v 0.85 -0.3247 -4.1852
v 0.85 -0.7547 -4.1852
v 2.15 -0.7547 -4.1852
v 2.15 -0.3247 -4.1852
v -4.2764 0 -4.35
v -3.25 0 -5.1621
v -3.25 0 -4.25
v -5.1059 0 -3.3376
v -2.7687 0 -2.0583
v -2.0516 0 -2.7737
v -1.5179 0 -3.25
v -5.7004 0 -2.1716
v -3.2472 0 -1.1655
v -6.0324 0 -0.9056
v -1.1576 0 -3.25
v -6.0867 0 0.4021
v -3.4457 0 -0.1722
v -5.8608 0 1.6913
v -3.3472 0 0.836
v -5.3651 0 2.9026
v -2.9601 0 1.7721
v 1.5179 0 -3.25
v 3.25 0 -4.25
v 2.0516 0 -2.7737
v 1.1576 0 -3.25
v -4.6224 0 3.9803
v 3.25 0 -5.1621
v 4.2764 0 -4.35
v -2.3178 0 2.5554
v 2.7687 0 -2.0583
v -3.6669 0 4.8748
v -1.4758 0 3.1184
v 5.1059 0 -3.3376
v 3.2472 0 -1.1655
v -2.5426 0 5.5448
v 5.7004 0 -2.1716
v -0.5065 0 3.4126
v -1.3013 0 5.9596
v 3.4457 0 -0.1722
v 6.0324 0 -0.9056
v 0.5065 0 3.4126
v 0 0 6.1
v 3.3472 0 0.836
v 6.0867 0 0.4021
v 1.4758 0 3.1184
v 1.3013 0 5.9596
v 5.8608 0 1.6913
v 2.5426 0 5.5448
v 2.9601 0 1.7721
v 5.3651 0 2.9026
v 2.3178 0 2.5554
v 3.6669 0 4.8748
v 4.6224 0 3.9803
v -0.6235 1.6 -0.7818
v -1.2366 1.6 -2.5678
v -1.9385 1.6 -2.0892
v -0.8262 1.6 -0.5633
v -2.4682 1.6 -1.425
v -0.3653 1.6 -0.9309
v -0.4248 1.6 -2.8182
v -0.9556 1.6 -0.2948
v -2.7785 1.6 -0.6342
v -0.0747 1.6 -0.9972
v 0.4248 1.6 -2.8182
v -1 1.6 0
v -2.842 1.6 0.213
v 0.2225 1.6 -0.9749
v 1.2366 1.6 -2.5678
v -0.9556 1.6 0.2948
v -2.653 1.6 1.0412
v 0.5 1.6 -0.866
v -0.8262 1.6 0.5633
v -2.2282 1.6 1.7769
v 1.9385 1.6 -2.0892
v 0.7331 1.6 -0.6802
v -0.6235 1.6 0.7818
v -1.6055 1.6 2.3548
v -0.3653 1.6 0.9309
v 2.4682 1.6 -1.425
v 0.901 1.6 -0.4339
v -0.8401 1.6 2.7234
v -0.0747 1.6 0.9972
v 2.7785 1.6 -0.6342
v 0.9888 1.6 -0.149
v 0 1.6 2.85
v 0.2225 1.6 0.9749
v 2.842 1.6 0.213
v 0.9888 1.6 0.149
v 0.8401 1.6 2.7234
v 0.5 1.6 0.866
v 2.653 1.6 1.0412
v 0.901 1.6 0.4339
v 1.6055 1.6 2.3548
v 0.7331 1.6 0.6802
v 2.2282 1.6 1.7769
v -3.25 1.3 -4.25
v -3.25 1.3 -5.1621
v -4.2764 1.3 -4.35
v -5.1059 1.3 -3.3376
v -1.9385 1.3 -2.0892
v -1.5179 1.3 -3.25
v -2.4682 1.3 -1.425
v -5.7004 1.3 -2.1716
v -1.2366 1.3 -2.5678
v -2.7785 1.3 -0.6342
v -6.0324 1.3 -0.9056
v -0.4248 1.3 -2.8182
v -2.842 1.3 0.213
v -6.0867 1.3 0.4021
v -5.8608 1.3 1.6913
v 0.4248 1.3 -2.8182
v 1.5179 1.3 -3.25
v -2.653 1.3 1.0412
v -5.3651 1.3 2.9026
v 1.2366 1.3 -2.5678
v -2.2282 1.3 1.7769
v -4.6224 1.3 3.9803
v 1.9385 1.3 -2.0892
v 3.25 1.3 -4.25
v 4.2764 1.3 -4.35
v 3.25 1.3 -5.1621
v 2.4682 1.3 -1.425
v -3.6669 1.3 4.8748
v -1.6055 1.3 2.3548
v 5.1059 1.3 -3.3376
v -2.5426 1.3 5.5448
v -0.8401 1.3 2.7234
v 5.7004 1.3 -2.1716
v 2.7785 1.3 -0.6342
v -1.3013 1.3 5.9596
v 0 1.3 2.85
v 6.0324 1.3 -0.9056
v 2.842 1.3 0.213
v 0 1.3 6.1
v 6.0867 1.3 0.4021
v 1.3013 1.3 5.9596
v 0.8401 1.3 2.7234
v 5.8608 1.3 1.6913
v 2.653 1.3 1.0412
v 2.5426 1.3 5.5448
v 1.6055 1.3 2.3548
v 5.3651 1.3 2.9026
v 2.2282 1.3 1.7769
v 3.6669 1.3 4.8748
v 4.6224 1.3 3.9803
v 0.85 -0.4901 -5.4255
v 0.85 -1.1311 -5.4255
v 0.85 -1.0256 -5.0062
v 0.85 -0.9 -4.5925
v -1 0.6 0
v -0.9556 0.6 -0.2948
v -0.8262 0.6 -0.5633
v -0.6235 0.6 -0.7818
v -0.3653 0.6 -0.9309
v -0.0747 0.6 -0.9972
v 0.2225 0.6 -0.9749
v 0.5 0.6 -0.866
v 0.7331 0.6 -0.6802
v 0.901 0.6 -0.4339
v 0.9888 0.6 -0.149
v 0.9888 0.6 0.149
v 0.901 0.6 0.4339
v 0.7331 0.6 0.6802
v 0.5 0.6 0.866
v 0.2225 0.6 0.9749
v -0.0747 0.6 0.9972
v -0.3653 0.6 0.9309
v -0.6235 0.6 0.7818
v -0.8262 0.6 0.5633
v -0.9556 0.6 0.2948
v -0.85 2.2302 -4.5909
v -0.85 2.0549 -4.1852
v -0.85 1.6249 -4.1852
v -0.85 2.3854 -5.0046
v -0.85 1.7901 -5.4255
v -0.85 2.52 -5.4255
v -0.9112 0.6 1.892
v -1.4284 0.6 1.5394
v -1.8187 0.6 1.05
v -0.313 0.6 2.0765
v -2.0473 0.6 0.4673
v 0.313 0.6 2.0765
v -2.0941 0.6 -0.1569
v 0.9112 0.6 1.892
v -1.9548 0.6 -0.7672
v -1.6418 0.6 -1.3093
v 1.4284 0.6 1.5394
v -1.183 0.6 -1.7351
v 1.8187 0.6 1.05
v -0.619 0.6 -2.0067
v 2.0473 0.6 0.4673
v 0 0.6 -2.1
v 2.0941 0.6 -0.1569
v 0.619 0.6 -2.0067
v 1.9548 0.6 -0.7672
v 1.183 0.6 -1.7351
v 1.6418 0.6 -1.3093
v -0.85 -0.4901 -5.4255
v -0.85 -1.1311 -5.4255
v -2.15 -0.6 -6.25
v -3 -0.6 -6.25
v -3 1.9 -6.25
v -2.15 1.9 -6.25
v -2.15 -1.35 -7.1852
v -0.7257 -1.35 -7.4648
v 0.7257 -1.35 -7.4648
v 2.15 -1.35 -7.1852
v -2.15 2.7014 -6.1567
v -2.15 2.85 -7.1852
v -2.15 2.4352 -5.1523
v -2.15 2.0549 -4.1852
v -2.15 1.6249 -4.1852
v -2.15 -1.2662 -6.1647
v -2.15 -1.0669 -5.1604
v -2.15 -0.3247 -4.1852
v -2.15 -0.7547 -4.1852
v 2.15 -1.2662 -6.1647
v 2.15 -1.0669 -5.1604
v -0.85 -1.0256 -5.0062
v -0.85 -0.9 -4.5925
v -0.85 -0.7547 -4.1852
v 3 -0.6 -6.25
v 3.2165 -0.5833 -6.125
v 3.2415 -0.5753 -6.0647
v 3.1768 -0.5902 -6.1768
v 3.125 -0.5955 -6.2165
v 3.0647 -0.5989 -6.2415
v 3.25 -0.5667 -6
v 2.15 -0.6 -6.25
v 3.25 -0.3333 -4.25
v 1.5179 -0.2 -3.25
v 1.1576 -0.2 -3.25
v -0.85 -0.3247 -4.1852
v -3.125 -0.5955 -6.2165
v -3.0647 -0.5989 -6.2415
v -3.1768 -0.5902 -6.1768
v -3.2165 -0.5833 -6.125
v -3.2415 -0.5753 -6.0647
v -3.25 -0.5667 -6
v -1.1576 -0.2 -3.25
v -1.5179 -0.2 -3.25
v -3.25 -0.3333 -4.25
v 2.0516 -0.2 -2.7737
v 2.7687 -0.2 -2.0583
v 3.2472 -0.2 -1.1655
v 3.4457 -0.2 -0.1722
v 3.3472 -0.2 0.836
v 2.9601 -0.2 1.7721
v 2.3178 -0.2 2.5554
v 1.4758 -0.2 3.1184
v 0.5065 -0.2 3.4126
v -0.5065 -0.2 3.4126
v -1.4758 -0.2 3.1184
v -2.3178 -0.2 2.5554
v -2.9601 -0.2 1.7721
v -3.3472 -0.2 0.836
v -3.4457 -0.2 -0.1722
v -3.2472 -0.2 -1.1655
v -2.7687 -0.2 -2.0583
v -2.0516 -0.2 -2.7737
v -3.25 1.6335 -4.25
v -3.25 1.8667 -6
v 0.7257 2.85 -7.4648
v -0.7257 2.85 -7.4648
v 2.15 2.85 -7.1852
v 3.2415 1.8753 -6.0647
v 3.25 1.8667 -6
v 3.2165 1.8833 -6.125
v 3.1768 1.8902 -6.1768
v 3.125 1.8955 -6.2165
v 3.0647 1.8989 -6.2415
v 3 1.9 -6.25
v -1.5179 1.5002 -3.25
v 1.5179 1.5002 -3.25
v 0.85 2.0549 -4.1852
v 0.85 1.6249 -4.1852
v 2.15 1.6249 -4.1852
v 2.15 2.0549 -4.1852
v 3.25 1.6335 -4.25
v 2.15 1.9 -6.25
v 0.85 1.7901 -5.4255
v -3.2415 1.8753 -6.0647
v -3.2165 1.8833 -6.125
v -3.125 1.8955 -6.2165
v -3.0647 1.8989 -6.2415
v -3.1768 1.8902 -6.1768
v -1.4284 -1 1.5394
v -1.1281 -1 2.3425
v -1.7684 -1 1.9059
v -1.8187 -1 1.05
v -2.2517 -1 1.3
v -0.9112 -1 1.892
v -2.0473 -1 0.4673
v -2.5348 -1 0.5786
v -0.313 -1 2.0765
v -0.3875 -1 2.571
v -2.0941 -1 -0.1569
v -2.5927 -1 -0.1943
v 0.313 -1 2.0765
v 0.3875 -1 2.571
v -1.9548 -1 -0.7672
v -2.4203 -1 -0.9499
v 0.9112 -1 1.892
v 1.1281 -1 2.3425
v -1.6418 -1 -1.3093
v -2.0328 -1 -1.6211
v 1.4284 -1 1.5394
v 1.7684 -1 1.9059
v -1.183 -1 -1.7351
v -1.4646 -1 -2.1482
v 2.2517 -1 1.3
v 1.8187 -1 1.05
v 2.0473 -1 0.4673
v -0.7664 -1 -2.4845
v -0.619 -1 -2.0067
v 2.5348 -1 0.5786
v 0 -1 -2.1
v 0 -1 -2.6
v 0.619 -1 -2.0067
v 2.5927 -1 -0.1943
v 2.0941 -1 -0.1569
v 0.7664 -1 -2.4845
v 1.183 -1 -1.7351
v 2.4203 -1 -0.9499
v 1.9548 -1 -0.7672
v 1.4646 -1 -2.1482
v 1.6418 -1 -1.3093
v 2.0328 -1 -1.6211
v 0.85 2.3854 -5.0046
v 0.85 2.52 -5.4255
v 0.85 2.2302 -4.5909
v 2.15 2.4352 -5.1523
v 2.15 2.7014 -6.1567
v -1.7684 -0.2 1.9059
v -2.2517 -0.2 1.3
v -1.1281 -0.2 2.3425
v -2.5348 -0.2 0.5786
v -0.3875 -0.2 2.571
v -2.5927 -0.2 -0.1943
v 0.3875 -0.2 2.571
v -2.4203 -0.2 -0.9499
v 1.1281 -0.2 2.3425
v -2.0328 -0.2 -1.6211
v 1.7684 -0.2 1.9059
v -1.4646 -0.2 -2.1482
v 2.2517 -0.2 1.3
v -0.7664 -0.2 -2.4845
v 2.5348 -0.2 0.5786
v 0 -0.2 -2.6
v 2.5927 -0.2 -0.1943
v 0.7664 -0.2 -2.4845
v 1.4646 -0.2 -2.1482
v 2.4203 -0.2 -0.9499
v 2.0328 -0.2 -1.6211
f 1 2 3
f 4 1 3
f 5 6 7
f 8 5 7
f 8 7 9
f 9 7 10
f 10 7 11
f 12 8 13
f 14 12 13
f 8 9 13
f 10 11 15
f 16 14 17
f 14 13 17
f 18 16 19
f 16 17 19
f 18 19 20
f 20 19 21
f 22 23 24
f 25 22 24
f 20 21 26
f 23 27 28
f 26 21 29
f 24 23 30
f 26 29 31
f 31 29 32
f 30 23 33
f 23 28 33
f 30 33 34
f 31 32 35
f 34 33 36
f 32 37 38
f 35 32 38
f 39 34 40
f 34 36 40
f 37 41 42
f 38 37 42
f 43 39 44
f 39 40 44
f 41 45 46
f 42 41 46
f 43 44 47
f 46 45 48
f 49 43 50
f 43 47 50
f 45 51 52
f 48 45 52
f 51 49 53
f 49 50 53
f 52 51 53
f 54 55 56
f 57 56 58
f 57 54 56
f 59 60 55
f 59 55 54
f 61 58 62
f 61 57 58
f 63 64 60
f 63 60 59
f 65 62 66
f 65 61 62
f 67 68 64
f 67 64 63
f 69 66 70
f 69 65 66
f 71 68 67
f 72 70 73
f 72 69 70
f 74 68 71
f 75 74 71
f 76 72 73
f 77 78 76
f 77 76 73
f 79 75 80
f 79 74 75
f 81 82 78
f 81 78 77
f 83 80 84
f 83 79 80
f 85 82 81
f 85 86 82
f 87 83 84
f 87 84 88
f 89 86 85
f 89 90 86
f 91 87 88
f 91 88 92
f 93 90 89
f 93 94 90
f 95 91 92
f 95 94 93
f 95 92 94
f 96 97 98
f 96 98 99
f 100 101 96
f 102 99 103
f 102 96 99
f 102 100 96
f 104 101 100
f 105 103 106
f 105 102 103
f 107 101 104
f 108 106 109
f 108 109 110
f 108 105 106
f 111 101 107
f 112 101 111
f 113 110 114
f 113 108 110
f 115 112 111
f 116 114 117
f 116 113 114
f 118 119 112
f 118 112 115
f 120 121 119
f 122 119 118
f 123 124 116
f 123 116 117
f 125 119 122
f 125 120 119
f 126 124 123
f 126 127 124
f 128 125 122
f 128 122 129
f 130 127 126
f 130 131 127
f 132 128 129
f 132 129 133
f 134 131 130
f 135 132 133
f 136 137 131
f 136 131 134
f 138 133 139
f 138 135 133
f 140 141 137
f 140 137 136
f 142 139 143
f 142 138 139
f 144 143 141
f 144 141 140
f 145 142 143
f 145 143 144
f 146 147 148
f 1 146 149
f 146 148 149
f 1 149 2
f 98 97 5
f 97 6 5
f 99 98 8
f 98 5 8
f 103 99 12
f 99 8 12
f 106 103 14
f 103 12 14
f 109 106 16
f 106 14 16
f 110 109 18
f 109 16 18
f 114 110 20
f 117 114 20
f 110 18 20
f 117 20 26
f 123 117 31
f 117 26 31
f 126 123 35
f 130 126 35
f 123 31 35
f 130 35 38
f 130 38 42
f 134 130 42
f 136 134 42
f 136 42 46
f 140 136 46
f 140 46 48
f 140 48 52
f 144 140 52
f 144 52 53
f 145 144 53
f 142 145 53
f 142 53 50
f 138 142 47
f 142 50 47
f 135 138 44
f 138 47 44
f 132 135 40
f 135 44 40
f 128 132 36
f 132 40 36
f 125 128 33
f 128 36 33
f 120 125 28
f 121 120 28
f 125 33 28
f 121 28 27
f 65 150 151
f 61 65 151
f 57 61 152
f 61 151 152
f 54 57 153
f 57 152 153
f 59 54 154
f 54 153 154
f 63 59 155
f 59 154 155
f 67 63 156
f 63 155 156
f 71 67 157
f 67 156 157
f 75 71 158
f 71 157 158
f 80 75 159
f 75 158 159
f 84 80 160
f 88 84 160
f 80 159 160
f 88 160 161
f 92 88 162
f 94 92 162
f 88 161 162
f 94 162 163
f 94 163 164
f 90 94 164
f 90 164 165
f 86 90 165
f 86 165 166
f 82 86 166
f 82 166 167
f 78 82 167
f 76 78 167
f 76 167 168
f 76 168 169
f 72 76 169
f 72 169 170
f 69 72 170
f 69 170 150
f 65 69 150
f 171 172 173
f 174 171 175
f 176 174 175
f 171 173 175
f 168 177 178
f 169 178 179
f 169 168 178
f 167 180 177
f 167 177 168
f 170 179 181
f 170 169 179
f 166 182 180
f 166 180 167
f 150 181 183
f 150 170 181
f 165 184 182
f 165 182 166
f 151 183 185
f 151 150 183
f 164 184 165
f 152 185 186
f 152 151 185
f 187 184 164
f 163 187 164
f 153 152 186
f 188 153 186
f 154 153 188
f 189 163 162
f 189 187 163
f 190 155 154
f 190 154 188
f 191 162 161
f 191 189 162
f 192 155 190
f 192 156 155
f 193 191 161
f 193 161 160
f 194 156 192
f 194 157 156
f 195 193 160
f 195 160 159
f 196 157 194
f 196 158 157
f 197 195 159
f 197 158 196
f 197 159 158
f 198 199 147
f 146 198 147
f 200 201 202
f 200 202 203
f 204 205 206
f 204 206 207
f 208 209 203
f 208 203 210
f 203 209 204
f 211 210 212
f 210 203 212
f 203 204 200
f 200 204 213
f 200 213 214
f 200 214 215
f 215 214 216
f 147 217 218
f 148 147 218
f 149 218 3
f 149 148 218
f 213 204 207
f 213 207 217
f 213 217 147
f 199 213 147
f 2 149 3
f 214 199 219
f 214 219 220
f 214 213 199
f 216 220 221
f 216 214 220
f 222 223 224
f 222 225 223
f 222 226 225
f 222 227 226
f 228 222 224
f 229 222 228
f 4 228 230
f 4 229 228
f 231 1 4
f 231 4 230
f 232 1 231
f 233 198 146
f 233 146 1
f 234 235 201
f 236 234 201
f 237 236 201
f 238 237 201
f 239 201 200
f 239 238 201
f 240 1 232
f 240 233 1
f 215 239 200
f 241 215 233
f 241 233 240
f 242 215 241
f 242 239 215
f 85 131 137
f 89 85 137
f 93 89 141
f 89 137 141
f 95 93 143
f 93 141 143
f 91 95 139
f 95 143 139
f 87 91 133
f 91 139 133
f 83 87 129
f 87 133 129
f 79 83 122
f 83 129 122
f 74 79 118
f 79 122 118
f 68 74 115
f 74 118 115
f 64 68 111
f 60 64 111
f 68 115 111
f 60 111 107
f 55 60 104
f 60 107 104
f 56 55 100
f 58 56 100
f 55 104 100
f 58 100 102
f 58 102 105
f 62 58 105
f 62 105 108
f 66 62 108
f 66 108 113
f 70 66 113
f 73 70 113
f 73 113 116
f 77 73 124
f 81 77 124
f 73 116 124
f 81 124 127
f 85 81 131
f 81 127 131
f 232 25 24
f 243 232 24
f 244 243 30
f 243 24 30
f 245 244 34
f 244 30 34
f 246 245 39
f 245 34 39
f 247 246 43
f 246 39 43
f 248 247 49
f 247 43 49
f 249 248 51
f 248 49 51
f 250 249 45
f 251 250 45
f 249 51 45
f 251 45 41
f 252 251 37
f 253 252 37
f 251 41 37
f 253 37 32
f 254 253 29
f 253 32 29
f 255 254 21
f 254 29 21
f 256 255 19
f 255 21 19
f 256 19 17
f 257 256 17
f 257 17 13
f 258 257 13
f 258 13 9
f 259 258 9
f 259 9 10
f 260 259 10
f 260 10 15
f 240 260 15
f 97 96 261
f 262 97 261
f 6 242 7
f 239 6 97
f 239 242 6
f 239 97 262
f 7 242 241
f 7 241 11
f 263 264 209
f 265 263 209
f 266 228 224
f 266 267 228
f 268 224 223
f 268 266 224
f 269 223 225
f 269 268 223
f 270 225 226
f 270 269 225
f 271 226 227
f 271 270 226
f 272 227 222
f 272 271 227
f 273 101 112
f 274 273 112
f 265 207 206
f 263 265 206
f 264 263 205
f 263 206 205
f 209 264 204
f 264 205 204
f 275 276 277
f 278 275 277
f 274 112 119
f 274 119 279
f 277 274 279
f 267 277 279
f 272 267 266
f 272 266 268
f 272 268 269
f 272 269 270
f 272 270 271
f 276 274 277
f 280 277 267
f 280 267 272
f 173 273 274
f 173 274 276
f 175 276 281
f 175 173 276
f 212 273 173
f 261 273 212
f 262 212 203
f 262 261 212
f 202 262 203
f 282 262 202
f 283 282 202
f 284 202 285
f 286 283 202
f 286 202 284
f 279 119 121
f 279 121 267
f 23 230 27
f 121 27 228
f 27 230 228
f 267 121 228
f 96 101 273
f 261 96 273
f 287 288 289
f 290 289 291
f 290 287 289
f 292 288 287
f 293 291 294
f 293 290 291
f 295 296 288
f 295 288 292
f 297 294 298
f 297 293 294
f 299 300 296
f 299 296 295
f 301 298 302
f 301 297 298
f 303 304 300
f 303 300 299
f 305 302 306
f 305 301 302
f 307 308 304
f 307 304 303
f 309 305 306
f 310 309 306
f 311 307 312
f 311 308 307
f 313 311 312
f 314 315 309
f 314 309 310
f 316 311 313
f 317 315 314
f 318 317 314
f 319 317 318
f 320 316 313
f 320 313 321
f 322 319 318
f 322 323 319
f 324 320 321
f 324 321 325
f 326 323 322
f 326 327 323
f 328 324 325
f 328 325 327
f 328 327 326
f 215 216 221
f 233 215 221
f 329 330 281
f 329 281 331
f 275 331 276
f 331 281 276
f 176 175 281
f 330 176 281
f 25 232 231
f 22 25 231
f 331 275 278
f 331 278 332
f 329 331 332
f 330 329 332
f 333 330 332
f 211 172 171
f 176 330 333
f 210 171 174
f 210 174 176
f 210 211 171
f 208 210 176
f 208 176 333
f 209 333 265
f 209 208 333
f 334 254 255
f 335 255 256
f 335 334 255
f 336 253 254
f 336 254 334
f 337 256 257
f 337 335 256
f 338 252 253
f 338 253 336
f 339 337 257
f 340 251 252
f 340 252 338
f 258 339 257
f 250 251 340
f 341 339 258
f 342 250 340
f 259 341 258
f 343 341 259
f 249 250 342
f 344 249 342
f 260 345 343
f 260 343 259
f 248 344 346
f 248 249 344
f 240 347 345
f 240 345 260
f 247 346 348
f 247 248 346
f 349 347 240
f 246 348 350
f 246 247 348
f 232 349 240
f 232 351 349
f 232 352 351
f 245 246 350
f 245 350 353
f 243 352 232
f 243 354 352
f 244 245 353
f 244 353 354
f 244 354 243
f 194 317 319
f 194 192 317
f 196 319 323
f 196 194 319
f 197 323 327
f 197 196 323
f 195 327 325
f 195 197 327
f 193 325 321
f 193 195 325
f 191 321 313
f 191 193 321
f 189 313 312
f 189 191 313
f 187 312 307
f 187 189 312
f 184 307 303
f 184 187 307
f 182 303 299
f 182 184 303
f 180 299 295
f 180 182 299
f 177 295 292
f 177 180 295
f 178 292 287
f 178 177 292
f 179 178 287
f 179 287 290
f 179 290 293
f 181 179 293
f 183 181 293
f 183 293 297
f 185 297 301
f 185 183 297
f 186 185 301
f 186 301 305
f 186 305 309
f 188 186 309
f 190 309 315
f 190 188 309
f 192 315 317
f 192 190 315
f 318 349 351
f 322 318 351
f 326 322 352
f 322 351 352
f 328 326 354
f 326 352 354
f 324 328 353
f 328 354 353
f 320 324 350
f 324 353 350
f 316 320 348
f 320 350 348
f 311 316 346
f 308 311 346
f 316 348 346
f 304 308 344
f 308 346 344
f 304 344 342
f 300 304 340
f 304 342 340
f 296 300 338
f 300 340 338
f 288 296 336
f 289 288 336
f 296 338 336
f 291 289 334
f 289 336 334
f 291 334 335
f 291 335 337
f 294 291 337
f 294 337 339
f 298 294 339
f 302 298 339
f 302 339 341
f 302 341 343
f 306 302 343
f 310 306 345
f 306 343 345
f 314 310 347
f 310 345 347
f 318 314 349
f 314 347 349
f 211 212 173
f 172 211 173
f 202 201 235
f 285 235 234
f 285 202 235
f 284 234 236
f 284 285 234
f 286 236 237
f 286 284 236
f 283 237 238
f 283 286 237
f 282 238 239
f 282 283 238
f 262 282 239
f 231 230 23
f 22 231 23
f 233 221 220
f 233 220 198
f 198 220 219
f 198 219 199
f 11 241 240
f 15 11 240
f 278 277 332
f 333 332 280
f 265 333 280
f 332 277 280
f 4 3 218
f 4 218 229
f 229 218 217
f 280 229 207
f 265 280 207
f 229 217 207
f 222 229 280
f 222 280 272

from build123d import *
from OCP.BRepFilletAPI import BRepFilletAPI_MakeChamfer

# Parameters (mm, degrees)
SKETCH1_R                 = 6.1
BOSS_EXTRUDE1_DEPTH       = 1.3
SKETCH2_R                 = 2.85
BOSS_EXTRUDE2_DEPTH       = 0.3
SKETCH5_R                 = 3.45
BOSS_EXTRUDE3_DEPTH       = 0.2
F_2_0MM_DOWEL_HOLE1_D     = 2
F_2_0MM_DOWEL_HOLE1_DEPTH = 52.32
F_2_0MM_DOWEL_HOLE1_TIP   = 0.600860619
SKETCH6_R                 = 2.6
SKETCH6_R_2               = 2.1
BOSS_EXTRUDE4_DEPTH       = 0.8
CUT_EXTRUDE1_START        = -1.6
SKETCH8_R                 = 2.1
CUT_EXTRUDE1_DEPTH        = 1.6
BOSS_EXTRUDE5_DEPTH       = 1.9
BOSS_EXTRUDE5_DEPTH_BACK  = 0.6
SKETCH9_W                 = 6.5
SKETCH9_H                 = 3
CHAMFER1_SIZE             = 1
CHAMFER1_SIZE2            = 1.732050808
CUT_EXTRUDE2_DEPTH        = 12.405919516
CUT_EXTRUDE2_DEPTH_BACK   = 12.405919516
BOSS_EXTRUDE6_DEPTH       = 2.2
BOSS_EXTRUDE6_DEPTH_BACK  = 2
BOSS_EXTRUDE6_START       = 0.65
CUT_EXTRUDE3_DEPTH        = 10
FILLET1_R                 = 0.25


with BuildPart() as part:
    # Sketch1 → Boss-Extrude1 (new body)
    with BuildSketch(Plane(origin=(0, 0, 0), x_dir=(1, 0, 0), z_dir=(0, 1, 0))):
        with Locations(Location((0, 0, 0), (0, 0, 270))):
            Circle(SKETCH1_R)
    extrude(amount=BOSS_EXTRUDE1_DEPTH)

    # Sketch2 → Boss-Extrude2 (add)
    with BuildSketch(Plane(origin=(0, 1.3, 0), x_dir=(1, 0, 0), z_dir=(0, 1, 0))):
        with Locations(Location((0, 0, 0), (0, 0, 270))):
            Circle(SKETCH2_R)
    extrude(amount=BOSS_EXTRUDE2_DEPTH)

    # Sketch5 → Boss-Extrude3 (add)
    with BuildSketch(Plane.XZ):
        with Locations(Location((0, 0, 0), (0, 0, 270))):
            Circle(SKETCH5_R)
    extrude(amount=BOSS_EXTRUDE3_DEPTH)

    # Ø2.0mm Dowel Hole1
    with Locations(Plane(origin=(0, 1.6, 0), x_dir=(1, 0, 0), z_dir=(0, 1, 0))):
        with Locations((0, 0)):
            Hole(F_2_0MM_DOWEL_HOLE1_D / 2, depth=F_2_0MM_DOWEL_HOLE1_DEPTH)
            with Locations((0, 0, -(F_2_0MM_DOWEL_HOLE1_DEPTH + F_2_0MM_DOWEL_HOLE1_TIP / 2))):  # 118° drill point
                Cone(0, F_2_0MM_DOWEL_HOLE1_D / 2, F_2_0MM_DOWEL_HOLE1_TIP, mode=Mode.SUBTRACT)

    # Sketch6 → Boss-Extrude4 (add)
    with BuildSketch(Plane.XZ.offset(0.2)):
        with Locations(Location((0, 0, 0), (0, 0, 270))):
            Circle(SKETCH6_R)
        with Locations(Location((0, 0, 0), (0, 0, 270))):
            Circle(SKETCH6_R_2, mode=Mode.SUBTRACT)
    extrude(amount=BOSS_EXTRUDE4_DEPTH)

    # Sketch8 → Cut-Extrude1 (cut)
    with BuildSketch(Plane.XZ.offset(1).offset(CUT_EXTRUDE1_START)):
        with Locations(Location((0, 0, 0), (0, 0, 270))):
            Circle(SKETCH8_R)
    extrude(amount=CUT_EXTRUDE1_DEPTH, mode=Mode.SUBTRACT)

    # Sketch9 → Boss-Extrude5 (add, two sides: drawn at the far end of the back side and taken through both)
    with BuildSketch(Plane(origin=(0, 0, 0), x_dir=(1, 0, 0), z_dir=(0, 1, 0)).offset(-BOSS_EXTRUDE5_DEPTH_BACK)):
        with Locations((0, 4.75)):
            Rectangle(SKETCH9_W, SKETCH9_H)
    extrude(amount=BOSS_EXTRUDE5_DEPTH + BOSS_EXTRUDE5_DEPTH_BACK)

    # Chamfer1: one chamfer whose edges measure the first distance from different faces: ONE call of the kernel's chamfer builder (chamfer() names one face for all edges)
    chamfer1_edges_1 = [part.edges().sort_by_distance(p)[0] for p in [
        (3.25, -0.3, -3.25),
        (3.25, 1.6, -3.25),
    ]]
    chamfer1_side_1 = [part.faces().sort_by_distance(p)[0] for p in [
        (3.25, 1.6, -3.289051248),
    ]]
    chamfer1_edges_2 = [part.edges().sort_by_distance(p)[0] for p in [
        (-3.25, 1.6, -3.25),
        (-3.25, -0.3, -3.25),
    ]]
    chamfer1_side_2 = [part.faces().sort_by_distance(p)[0] for p in [
        (-3.25, 0.65, -6.210948752),
    ]]
    chamfer1 = BRepFilletAPI_MakeChamfer(part.part.solid().wrapped)
    for e in chamfer1_edges_1:
        chamfer1.Add(CHAMFER1_SIZE, CHAMFER1_SIZE2, e.wrapped, chamfer1_side_1[0].wrapped)  # the first distance lies on this face
    for e in chamfer1_edges_2:
        chamfer1.Add(CHAMFER1_SIZE, CHAMFER1_SIZE2, e.wrapped, chamfer1_side_2[0].wrapped)  # the first distance lies on this face
    add(Compound.cast(chamfer1.Shape()), mode=Mode.REPLACE)

    # Sketch10 → Cut-Extrude2 (cut, two sides: drawn at the far end of the back side and taken through both)
    with BuildSketch(Plane(origin=(3.25, 0, 0), x_dir=(0, 0, -1), z_dir=(1, 0, 0)).offset(-CUT_EXTRUDE2_DEPTH_BACK)):
        Polygon((3.25, 1.500247446), (6.25, 1.9), (3.25, 1.9), align=None)
        Polygon((3.25, -0.6), (6.25, -0.6), (3.25, -0.2), align=None)
    extrude(amount=CUT_EXTRUDE2_DEPTH + CUT_EXTRUDE2_DEPTH_BACK, mode=Mode.SUBTRACT)

    # Sketch11 → Boss-Extrude6 (add, two sides: drawn at the far end of the back side and taken through both)
    with BuildSketch(Plane(origin=(0, 0, 0), x_dir=(1, 0, 0), z_dir=(0, 1, 0)).offset(BOSS_EXTRUDE6_START - BOSS_EXTRUDE6_DEPTH_BACK)):
        with BuildLine():
            Line((-2.15, 7.185227902), (-2.15, 4.185227902))
            Line((-2.15, 4.185227902), (-0.85, 4.185227902))
            Line((-0.85, 4.185227902), (-0.85, 5.425500648))
            Line((-0.85, 5.425500648), (0.85, 5.425500648))
            Line((0.85, 5.425500648), (0.85, 4.185227902))
            Line((0.85, 4.185227902), (2.15, 4.185227902))
            Line((2.15, 4.185227902), (2.15, 7.185227902))
            ThreePointArc((2.15, 7.185227902), (0, 7.5), (-2.15, 7.185227902))
        make_face()
    extrude(amount=BOSS_EXTRUDE6_DEPTH + BOSS_EXTRUDE6_DEPTH_BACK)

    # Sketch12 → Cut-Extrude3 (cut)
    with BuildSketch(Plane.ZY.offset(2.15)):
        with BuildLine():
            Line((-7.185227902, 2.85), (-4.185227902, 2.85))
            Line((-4.185227902, 2.85), (-4.185227902, 2.05486736))
            ThreePointArc((-4.185227902, 2.05486736), (-5.650660459, 2.582855102), (-7.185227902, 2.85))
        make_face()
        with BuildLine():
            Line((-4.185227902, -0.754697054), (-4.185227902, -1.35))
            Line((-4.185227902, -1.35), (-7.185227902, -1.35))
            ThreePointArc((-7.185227902, -1.35), (-5.659726016, -1.180864031), (-4.185227902, -0.754697054))
        make_face()
    extrude(amount=-CUT_EXTRUDE3_DEPTH, mode=Mode.SUBTRACT)

    # Fillet1
    fillet1_edges = [part.edges().sort_by_distance(p)[0] for p in [
        (-3.25, 0.65, -6.25),
        (3.25, 0.65, -6.25),
    ]]
    fillet(fillet1_edges, radius=FILLET1_R)


solid = part.part
